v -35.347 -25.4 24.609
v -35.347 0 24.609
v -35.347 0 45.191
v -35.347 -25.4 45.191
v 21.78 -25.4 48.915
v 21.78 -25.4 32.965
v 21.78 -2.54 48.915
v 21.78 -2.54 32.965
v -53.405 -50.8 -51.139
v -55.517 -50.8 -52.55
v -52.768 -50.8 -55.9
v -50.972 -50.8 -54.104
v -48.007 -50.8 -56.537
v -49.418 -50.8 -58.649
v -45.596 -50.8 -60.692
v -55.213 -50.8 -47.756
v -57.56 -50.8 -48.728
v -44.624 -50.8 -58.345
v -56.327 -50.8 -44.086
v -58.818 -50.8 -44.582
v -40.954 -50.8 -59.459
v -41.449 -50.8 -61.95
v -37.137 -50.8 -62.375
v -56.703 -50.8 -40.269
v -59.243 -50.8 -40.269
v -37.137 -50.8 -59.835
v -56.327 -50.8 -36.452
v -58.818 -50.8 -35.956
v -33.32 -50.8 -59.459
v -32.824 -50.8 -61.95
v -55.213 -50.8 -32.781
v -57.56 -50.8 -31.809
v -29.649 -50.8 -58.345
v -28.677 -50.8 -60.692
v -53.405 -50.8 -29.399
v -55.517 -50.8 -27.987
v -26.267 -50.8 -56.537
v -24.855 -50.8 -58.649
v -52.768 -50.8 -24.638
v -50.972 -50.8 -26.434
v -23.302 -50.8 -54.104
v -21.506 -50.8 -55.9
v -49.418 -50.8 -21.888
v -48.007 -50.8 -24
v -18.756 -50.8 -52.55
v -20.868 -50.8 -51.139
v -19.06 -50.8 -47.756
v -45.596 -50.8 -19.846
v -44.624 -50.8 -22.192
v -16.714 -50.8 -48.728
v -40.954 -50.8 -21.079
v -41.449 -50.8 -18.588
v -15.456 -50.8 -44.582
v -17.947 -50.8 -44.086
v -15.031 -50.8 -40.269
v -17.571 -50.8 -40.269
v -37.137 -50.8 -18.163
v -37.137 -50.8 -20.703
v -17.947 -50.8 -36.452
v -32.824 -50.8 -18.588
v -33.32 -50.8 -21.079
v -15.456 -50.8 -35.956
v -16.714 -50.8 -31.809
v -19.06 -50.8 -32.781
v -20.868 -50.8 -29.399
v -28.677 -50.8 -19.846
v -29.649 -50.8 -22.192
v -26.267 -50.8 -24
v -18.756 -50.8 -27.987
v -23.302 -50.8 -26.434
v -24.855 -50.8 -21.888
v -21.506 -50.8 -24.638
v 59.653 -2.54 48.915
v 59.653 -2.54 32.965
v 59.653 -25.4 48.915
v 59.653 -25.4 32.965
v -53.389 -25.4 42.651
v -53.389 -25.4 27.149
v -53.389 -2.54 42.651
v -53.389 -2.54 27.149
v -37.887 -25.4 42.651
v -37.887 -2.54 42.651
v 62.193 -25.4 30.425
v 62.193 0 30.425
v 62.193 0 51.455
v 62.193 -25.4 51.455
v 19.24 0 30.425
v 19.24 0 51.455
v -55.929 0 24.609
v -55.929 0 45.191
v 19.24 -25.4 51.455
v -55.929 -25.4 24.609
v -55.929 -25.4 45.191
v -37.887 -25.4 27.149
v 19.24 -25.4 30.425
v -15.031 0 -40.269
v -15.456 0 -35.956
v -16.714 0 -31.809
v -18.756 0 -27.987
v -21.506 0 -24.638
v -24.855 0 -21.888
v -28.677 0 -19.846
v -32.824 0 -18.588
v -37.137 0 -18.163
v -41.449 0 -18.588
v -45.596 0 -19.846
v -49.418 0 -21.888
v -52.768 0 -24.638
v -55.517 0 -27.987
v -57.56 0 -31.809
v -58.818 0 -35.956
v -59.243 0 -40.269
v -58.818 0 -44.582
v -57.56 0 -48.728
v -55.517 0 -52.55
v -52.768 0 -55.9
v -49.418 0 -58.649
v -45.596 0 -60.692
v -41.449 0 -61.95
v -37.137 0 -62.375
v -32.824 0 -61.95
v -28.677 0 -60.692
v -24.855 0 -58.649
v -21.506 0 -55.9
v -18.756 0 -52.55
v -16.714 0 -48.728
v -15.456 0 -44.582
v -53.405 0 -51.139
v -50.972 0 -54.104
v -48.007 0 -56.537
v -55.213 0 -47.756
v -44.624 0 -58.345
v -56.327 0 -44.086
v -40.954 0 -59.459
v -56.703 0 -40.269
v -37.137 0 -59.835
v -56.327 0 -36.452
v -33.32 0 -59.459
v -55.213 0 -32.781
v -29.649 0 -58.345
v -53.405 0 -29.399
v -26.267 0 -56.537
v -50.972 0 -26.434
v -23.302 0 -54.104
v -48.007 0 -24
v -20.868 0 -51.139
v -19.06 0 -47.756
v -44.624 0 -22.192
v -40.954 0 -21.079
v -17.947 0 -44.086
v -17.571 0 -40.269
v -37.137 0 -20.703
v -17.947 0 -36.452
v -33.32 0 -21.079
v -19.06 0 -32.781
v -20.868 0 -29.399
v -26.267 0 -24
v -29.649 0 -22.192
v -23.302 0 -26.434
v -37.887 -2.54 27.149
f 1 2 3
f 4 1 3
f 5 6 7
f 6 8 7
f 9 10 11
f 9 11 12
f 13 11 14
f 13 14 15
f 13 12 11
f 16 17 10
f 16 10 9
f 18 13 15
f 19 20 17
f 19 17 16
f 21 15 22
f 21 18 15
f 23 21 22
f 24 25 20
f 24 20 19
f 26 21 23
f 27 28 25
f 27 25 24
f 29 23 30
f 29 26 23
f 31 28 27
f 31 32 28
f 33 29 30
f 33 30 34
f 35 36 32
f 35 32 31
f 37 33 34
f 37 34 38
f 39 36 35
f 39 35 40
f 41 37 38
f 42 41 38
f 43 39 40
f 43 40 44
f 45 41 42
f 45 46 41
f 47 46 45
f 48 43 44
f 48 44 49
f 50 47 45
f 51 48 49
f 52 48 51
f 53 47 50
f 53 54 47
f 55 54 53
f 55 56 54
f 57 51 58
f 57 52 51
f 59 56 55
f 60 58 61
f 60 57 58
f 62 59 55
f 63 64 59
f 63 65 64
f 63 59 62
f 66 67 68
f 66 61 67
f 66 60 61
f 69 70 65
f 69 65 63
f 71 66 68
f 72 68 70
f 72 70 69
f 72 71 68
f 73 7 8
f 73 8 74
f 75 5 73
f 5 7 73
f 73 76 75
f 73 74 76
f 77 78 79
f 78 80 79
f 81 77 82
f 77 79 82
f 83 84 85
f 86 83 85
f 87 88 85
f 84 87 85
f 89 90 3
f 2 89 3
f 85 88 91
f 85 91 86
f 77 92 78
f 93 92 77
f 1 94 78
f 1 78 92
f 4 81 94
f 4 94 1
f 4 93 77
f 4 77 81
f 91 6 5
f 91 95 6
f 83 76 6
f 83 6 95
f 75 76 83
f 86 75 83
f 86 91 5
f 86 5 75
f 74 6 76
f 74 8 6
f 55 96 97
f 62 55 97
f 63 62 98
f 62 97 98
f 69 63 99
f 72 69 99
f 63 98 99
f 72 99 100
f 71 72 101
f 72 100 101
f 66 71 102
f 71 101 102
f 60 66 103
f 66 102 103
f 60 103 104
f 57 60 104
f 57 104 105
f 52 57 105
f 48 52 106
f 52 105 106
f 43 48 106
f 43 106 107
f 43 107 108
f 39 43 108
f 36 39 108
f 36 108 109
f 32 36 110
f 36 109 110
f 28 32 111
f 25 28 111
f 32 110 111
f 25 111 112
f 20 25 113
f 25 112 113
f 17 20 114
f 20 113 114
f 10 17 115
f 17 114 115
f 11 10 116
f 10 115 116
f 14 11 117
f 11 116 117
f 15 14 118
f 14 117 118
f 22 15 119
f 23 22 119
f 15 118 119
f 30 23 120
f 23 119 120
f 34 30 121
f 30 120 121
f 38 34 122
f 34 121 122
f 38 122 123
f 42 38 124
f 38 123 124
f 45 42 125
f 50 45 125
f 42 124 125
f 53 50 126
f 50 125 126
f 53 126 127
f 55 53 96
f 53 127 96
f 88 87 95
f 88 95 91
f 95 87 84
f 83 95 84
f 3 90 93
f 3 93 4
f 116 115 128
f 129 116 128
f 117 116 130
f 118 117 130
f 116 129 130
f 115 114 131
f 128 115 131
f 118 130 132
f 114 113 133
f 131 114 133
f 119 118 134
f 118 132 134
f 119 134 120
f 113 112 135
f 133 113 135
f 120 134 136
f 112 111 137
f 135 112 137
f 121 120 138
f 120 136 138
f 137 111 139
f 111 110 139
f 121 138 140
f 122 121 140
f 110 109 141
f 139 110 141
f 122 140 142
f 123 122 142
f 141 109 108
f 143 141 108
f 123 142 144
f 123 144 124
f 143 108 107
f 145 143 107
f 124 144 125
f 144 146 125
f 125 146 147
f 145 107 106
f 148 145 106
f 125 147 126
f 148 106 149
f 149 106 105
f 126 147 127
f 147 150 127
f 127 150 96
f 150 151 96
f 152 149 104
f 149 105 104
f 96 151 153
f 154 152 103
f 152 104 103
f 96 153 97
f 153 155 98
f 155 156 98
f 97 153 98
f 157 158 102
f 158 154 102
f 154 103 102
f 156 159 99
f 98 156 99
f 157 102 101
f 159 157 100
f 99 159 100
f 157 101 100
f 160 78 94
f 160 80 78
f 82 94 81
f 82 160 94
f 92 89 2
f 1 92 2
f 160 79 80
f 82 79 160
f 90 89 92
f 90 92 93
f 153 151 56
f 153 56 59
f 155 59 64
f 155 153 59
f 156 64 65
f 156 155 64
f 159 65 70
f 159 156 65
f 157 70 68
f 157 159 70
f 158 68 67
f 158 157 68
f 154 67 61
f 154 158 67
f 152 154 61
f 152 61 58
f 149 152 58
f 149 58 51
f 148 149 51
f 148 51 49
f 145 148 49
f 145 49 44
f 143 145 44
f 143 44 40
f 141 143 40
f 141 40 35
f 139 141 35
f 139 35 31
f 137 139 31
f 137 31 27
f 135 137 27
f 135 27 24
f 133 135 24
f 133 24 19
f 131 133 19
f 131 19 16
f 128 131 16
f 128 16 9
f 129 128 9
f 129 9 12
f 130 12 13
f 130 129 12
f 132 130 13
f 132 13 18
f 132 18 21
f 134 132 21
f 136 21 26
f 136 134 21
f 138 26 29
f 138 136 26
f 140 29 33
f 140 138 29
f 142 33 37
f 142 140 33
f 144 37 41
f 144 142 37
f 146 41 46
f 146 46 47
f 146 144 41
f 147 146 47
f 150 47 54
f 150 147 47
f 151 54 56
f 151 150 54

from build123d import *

# Parameters (mm, degrees)
F0_W     = 20.581853
F0_H     = 20.581847
F1_DEPTH = 25.4
F2_W     = 42.953434
F2_H     = 21.02928
F3_DEPTH = 25.4
F4_R     = 22.106014
F5_DEPTH = 50.8
F6_T     = -2.54
F7_T     = -2.54
F8_T     = -2.54


with BuildPart() as f1:
    # F0 (on Front) → F1 (new body)
    with BuildSketch(Plane.XZ):
        with Locations((-45.638019, 34.89966)):
            Rectangle(F0_W, F0_H)
    extrude(amount=F1_DEPTH)

    # F7
    f7_openings = [f1.faces().sort_by_distance(p)[0] for p in [
        (-45.638019, -25.4, 34.89966),
    ]]
    offset(amount=F7_T, openings=f7_openings)


with BuildPart() as f3:
    # F2 (on Front) → F3 (new body)
    with BuildSketch(Plane.XZ):
        with Locations((40.716271, 40.939986)):
            Rectangle(F2_W, F2_H)
    extrude(amount=F3_DEPTH)

    # F8
    f8_openings = [f3.faces().sort_by_distance(p)[0] for p in [
        (40.716271, -25.4, 40.939986),
    ]]
    offset(amount=F8_T, openings=f8_openings)


with BuildPart() as f5:
    # F4 (on Front) → F5 (new body)
    with BuildSketch(Plane.XZ):
        with Locations((-37.136823, -40.268838)):
            Circle(F4_R)
    extrude(amount=F5_DEPTH)

    # F6
    f6_openings = [f5.faces().sort_by_distance(p)[0] for p in [
        (-37.136823, -50.8, -40.268838),
        (-37.136823, 0, -40.268838),
    ]]
    offset(amount=F6_T, openings=f6_openings)


solid = Compound([f1.part, f3.part, f5.part])
